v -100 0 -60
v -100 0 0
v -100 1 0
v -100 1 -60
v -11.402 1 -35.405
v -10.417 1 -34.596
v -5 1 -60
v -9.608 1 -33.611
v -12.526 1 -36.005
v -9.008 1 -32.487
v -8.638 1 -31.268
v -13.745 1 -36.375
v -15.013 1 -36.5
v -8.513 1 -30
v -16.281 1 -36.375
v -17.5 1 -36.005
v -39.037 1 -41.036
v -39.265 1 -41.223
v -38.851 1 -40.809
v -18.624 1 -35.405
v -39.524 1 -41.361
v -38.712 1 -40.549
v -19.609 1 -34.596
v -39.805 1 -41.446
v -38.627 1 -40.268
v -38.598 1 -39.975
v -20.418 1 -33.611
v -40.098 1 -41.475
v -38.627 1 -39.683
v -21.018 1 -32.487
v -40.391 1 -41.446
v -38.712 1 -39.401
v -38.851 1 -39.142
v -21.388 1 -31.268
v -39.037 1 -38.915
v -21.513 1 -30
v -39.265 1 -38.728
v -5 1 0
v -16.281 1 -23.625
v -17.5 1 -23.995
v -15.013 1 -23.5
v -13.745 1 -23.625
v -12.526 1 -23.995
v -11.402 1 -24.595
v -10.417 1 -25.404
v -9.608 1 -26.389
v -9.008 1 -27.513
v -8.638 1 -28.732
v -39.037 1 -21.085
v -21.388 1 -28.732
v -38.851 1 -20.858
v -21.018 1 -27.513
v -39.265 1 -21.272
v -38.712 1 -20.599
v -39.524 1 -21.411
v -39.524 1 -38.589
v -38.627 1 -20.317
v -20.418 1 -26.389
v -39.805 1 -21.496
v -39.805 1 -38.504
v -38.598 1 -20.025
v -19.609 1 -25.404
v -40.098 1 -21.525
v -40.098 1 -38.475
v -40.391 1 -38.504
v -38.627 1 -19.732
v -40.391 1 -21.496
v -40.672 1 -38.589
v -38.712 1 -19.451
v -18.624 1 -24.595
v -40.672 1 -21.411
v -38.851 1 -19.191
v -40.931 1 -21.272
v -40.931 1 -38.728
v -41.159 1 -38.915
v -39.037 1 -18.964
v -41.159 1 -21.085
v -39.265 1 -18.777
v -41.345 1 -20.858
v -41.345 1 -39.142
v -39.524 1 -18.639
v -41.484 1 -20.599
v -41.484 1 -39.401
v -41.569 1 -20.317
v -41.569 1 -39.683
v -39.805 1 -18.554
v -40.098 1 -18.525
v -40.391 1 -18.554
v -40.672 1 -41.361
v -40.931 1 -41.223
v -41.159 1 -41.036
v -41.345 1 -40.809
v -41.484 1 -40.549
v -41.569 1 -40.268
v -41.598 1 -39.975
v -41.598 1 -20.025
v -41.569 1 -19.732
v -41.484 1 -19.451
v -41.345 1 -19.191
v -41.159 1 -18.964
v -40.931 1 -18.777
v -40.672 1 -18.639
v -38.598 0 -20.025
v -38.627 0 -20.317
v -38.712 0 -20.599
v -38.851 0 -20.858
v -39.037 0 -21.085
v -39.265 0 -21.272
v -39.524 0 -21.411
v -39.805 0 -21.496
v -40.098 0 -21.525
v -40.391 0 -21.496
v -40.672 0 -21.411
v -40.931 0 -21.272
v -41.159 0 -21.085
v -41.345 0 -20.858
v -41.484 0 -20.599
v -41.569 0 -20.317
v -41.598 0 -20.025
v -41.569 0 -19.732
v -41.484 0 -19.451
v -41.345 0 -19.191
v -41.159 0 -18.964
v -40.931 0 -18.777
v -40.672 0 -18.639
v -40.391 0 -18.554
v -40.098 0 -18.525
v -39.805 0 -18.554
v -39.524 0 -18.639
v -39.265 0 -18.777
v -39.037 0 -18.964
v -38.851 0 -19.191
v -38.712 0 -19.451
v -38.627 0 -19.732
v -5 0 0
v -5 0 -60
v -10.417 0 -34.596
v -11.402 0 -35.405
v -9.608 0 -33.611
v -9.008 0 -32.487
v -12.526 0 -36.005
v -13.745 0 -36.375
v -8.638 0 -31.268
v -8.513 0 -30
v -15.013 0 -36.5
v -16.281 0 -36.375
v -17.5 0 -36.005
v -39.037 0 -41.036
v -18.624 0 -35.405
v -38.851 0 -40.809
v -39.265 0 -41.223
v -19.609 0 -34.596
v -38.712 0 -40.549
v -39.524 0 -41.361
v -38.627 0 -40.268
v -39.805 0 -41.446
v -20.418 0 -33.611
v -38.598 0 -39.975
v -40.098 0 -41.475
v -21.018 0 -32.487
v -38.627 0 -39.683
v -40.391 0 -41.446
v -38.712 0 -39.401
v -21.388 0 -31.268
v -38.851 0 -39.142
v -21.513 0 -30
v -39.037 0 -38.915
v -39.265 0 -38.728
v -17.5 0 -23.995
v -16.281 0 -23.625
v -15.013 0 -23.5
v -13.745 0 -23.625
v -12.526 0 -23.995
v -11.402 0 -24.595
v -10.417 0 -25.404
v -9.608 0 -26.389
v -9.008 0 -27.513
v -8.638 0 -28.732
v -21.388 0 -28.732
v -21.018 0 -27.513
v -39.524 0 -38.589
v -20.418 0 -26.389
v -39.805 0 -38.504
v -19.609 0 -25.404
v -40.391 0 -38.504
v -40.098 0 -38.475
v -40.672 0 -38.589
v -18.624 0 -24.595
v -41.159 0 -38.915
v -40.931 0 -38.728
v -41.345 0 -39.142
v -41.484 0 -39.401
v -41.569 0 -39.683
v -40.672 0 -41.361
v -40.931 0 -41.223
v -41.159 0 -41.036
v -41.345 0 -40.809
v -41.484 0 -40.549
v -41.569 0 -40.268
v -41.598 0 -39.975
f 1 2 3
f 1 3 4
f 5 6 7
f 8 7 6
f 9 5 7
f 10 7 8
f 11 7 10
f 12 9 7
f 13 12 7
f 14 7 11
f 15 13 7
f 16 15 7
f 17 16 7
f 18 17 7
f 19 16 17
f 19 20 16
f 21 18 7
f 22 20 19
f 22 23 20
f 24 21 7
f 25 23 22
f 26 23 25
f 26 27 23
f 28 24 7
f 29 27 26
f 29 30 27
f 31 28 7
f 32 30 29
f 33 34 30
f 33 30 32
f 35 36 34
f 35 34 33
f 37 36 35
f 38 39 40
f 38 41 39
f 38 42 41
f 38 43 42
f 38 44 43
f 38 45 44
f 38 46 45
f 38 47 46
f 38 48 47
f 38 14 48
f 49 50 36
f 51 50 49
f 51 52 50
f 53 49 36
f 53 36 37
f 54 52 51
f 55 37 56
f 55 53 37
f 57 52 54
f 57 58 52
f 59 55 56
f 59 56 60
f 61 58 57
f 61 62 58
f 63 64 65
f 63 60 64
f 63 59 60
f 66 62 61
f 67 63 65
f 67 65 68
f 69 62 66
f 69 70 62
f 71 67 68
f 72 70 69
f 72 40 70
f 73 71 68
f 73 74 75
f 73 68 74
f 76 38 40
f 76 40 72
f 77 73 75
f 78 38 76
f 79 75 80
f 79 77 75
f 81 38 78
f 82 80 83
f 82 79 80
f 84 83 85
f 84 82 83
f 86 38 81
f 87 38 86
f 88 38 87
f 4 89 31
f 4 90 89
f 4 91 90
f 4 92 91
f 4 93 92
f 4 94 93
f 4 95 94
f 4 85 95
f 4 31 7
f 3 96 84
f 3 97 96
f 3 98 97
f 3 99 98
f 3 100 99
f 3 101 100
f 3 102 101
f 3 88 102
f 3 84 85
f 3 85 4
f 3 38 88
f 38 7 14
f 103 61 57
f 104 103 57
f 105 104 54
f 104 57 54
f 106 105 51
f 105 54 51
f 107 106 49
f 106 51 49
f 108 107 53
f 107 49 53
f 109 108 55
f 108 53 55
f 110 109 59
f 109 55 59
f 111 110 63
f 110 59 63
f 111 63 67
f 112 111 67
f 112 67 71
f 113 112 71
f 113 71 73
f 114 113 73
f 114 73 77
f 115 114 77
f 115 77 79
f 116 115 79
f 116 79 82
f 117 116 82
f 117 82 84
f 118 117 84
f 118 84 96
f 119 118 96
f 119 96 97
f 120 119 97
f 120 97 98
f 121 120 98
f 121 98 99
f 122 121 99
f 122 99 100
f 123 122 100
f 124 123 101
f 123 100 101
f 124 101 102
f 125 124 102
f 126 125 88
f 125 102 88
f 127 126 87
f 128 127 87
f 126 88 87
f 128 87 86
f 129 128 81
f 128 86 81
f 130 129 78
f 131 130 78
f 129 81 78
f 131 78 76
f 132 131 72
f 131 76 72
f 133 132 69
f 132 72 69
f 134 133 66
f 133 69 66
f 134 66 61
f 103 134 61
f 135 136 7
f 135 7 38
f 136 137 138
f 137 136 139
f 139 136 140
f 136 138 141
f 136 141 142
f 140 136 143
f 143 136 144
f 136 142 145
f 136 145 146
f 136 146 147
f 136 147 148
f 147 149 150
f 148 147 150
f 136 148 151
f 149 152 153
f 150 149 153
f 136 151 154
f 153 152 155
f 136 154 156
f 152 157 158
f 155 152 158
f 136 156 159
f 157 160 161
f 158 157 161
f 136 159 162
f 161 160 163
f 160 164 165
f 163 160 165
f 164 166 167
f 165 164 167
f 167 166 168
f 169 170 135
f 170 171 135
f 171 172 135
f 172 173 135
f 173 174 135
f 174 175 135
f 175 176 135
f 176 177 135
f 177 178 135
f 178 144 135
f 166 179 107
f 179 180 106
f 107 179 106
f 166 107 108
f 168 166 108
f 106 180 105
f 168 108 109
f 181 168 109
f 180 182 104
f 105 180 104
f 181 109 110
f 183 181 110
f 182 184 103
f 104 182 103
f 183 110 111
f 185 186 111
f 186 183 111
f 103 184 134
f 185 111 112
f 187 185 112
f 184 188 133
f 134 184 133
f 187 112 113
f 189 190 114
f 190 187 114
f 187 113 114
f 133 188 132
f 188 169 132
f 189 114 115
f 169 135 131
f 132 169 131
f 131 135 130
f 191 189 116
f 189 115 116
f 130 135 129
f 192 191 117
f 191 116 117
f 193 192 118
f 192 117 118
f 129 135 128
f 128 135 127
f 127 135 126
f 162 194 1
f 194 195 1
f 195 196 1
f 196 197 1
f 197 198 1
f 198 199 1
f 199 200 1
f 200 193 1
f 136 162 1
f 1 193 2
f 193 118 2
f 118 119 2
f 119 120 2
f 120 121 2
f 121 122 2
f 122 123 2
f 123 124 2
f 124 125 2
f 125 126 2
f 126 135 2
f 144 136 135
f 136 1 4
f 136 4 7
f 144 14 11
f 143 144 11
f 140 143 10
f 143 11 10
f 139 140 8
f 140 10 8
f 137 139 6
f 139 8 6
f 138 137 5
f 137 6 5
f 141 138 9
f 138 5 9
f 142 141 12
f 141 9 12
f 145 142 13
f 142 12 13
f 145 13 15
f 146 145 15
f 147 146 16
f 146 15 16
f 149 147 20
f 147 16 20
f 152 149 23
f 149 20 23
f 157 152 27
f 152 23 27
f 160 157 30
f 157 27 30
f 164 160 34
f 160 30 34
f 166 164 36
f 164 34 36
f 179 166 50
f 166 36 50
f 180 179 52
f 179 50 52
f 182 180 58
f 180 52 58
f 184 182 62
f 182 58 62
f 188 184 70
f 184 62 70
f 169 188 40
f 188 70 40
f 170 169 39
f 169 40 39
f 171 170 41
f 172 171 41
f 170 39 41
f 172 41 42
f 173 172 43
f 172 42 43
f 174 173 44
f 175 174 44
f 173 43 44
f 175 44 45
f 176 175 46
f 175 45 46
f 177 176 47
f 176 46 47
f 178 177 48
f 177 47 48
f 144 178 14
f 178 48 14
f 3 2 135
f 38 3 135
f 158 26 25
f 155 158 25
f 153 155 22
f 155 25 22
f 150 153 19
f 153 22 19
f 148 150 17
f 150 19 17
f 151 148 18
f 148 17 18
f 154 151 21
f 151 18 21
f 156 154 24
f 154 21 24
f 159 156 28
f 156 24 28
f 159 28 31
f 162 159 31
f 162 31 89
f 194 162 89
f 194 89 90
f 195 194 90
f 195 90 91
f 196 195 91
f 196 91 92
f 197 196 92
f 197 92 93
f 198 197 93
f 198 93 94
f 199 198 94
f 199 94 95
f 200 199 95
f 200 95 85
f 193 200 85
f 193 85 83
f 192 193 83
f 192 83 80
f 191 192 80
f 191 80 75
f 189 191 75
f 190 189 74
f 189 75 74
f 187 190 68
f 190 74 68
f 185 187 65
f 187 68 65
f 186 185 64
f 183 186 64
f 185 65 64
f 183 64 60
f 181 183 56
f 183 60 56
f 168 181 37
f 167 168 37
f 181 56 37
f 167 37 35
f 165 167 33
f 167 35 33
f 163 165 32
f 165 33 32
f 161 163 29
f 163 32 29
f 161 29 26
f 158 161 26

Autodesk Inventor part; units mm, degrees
ref_plane "YZ Plane" through (0, 0, 0) normal (1, 0, 0) x (0, 1, 0)
ref_plane "XZ Plane" through (0, 0, 0) normal (0, 1, 0) x (-1, 0, 0)
ref_plane "XY Plane" through (0, 0, 0) normal (0, 0, 1) x (1, 0, 0)
sketch "Sketch1" plane through (0, 0, 0) normal (0, 1, 0) x (-1, 0, 0)
  line L0 (100, 0) -> (100, -60)
  line L1 (5, -60) -> (5, 0)
  line L2 (100, -60) -> (5, -60)
  line L3 (100, 0) -> (5, 0)
  point P0 (0, 0)
  dimension "d1" = 60
extrude "Extrusion1" add sketch "Sketch1" along normal blind 1
sketch "Sketch3" plane through (0, 1, 0) normal (0, 1, 0) x (1, 0, 0)
  point P0 (0, 0)
sketch "Sketch4" plane through (0, 1, 0) normal (0, 1, 0) x (1, 0, 0)
  point P0 (0, 0)
sketch "Sketch5" plane through (0, 1, 0) normal (0, 1, 0) x (1, 0, 0)
  circle A0 centre (-40.098, 20.0247) radius 1.5
  circle A1 centre (-40.098, 39.9753) radius 1.5
  circle A2 centre (-15.013, 30) radius 6.5
  point P0 (0, 0)
  dimension "d9" = 3
  dimension "d10" = 3
  dimension "d11" = 13
extrude "Extrusion3" cut sketch "Sketch5" against normal blind 1
properties part number "striking"
